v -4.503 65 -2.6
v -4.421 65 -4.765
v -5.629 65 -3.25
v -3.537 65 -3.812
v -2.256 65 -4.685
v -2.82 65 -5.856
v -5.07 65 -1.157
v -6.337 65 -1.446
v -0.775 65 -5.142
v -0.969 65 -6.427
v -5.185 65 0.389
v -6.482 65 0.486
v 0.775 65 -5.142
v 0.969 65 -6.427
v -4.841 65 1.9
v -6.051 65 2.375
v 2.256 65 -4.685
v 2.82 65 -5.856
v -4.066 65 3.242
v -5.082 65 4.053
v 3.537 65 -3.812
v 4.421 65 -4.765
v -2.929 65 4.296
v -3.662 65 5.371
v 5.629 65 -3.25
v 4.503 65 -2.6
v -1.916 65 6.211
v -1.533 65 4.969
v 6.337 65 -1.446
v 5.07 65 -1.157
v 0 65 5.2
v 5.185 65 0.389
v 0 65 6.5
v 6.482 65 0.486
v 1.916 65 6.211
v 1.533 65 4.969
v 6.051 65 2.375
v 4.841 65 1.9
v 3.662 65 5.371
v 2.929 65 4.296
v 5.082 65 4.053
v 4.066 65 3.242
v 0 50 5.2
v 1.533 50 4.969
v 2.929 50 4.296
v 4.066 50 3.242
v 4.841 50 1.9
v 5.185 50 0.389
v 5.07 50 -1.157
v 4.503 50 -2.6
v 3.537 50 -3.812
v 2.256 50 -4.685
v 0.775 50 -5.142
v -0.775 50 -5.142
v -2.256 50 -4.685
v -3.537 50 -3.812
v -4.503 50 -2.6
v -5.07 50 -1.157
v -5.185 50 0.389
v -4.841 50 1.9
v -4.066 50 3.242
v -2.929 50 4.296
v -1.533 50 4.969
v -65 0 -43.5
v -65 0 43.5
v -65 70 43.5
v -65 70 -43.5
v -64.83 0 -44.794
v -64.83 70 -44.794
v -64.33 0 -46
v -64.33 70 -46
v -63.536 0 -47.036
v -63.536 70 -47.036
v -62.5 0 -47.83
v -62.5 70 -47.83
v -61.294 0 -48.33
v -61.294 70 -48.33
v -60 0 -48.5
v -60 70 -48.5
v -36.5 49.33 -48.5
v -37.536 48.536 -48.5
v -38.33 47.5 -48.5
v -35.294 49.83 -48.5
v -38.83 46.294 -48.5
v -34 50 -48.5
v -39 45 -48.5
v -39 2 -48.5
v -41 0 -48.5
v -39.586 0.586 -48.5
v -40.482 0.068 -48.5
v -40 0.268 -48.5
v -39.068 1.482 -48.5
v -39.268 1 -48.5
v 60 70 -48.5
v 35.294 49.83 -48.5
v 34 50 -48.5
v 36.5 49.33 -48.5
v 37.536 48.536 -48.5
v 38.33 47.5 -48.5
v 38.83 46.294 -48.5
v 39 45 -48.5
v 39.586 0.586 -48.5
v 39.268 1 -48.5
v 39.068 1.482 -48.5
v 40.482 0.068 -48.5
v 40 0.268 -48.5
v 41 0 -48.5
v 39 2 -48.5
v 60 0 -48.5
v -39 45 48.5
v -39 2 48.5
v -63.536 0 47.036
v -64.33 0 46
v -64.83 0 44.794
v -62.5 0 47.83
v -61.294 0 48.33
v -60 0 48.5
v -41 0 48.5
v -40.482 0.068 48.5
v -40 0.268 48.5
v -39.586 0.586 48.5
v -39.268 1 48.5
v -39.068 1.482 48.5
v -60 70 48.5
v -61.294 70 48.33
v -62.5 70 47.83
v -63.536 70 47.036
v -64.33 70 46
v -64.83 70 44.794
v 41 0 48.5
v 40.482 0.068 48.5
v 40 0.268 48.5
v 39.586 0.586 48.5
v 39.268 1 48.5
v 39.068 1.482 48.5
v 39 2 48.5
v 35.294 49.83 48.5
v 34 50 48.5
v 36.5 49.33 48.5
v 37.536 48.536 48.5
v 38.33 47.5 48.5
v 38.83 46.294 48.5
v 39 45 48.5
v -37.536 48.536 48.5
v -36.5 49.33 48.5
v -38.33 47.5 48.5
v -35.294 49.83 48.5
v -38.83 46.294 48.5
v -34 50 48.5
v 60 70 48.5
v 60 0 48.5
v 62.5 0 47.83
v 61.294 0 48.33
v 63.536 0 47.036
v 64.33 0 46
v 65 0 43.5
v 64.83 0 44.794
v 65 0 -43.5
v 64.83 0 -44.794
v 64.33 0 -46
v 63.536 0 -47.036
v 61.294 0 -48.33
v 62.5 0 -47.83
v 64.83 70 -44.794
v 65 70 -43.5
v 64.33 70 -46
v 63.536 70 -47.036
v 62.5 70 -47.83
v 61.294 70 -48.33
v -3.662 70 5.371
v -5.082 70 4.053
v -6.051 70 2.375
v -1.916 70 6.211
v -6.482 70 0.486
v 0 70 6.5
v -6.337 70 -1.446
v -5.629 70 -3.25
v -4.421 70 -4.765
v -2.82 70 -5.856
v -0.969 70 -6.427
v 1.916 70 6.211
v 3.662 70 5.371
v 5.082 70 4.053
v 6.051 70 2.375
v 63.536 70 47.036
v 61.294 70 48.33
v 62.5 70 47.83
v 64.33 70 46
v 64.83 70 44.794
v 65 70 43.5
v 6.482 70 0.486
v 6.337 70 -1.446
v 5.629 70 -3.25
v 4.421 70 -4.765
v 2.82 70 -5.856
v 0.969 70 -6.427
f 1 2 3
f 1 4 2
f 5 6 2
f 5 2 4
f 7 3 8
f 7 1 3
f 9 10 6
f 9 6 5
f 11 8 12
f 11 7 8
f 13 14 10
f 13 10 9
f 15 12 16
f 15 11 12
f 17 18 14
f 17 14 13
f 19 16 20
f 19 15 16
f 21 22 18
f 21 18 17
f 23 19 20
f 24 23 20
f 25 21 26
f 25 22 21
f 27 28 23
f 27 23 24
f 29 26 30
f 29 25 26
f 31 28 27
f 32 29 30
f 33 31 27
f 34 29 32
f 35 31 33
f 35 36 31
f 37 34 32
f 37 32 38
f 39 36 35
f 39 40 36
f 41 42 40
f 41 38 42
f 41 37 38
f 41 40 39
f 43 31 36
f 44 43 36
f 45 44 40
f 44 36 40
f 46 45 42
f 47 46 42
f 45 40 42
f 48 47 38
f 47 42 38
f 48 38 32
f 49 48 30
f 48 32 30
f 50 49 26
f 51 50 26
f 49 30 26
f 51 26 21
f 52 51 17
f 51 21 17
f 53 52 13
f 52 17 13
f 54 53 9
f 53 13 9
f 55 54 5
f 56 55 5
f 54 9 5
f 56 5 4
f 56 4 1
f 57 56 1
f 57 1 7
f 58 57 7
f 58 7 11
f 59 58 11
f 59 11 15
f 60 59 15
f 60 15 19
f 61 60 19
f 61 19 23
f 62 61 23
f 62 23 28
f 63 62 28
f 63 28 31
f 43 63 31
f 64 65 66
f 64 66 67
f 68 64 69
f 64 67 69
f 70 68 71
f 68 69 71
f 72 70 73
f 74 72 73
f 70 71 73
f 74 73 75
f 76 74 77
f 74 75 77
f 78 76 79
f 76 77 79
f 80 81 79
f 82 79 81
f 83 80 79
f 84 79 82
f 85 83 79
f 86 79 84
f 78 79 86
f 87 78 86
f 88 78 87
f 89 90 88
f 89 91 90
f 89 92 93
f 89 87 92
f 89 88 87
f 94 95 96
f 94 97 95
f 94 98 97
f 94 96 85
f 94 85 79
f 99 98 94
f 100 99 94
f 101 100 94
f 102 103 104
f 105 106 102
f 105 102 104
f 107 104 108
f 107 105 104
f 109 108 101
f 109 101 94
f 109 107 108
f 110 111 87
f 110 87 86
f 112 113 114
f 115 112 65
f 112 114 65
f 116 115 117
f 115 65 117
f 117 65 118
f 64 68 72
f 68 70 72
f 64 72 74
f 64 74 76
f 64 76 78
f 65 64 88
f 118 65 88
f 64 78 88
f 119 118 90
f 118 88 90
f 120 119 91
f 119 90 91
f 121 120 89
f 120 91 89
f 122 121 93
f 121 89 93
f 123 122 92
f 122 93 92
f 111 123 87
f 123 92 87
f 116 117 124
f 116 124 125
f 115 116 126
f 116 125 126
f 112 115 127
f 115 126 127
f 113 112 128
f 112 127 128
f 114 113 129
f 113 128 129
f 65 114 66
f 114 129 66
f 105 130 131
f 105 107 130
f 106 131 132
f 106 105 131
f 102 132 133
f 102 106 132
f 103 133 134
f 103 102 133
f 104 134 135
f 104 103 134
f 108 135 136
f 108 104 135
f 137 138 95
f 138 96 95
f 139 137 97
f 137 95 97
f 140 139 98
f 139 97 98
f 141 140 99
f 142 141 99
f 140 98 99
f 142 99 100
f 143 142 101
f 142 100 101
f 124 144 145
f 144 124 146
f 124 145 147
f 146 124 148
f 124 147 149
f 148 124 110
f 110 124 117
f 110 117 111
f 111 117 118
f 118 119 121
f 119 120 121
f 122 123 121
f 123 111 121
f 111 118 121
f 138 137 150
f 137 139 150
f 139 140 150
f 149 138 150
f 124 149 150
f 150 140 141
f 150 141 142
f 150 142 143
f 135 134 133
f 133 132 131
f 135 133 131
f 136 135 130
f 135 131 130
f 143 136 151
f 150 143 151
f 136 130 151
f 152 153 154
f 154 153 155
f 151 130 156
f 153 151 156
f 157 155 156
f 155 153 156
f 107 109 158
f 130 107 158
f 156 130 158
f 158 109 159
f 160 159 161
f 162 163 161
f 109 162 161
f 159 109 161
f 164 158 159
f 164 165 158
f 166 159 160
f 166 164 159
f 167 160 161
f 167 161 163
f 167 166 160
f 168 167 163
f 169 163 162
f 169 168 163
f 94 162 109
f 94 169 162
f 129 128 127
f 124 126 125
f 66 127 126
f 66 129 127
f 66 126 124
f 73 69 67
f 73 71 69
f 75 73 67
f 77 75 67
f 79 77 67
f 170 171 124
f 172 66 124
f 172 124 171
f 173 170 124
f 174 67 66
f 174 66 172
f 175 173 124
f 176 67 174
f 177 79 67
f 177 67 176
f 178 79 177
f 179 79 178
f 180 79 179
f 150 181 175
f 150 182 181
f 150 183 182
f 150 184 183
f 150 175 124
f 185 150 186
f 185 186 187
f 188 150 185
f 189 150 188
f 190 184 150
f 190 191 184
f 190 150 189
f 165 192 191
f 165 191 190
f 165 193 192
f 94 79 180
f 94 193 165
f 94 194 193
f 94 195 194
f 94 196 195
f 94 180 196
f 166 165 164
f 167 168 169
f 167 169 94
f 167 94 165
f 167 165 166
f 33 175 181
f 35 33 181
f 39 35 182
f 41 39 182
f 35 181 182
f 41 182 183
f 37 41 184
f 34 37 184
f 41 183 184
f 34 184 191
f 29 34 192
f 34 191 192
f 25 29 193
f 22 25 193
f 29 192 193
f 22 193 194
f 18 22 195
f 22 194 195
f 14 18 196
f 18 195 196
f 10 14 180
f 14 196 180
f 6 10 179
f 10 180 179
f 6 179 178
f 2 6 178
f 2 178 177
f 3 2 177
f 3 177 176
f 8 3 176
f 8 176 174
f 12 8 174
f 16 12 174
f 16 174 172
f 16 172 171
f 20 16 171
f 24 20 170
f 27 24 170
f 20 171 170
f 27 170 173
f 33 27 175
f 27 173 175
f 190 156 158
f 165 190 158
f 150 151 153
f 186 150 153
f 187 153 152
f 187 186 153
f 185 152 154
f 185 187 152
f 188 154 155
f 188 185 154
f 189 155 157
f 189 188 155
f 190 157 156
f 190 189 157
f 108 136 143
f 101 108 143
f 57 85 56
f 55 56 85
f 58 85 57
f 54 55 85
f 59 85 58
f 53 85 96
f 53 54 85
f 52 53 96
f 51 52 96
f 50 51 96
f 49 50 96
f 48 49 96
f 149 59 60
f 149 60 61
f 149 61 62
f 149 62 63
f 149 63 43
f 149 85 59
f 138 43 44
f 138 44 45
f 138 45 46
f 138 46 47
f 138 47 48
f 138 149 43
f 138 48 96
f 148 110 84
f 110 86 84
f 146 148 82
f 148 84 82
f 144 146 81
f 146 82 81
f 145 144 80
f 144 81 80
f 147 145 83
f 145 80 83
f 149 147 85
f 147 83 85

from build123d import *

# Parameters (mm, degrees)
SKETCH1_W           = 130
SKETCH1_H           = 97
BOSS_EXTRUDE1_DEPTH = 70
SKETCH2_W           = 78
SKETCH2_H           = 50
CUT_EXTRUDE1_DEPTH  = 137.1396342
FILLET3_R           = 5
SKETCH3_R           = 5.2
CUT_EXTRUDE2_DEPTH  = 108.131928014
SKETCH4_R           = 6.5
CUT_EXTRUDE3_DEPTH  = 5
FILLET2_R           = 5
FILLET4_R           = 2


with BuildPart() as part:
    # Sketch1 → Boss-Extrude1 (new body)
    with BuildSketch(Plane(origin=(0, 0, 0), x_dir=(1, 0, 0), z_dir=(0, 1, 0))):
        Rectangle(SKETCH1_W, SKETCH1_H)
    extrude(amount=BOSS_EXTRUDE1_DEPTH)

    # Sketch2 → Cut-Extrude1 (cut, through all)
    with BuildSketch(Plane.XY.offset(48.5)):
        with Locations((0, 25)):
            Rectangle(SKETCH2_W, SKETCH2_H)
    extrude(amount=-CUT_EXTRUDE1_DEPTH, mode=Mode.SUBTRACT)

    # Fillet3
    fillet3_edges = [part.edges().sort_by_distance(p)[0] for p in [
        (-39, 50, 0),
        (39, 50, 0),
    ]]
    fillet(fillet3_edges, radius=FILLET3_R)

    # Sketch3 → Cut-Extrude2 (cut, through all)
    with BuildSketch(Plane(origin=(0, 70, 0), x_dir=(1, 0, 0), z_dir=(0, 1, 0))):
        with Locations(Location((0, 0, 0), (0, 0, 270))):
            Circle(SKETCH3_R)
    extrude(amount=-CUT_EXTRUDE2_DEPTH, mode=Mode.SUBTRACT)

    # Sketch4 → Cut-Extrude3 (cut)
    with BuildSketch(Plane(origin=(0, 70, 0), x_dir=(1, 0, 0), z_dir=(0, 1, 0))):
        with Locations(Location((0, 0, 0), (0, 0, 270))):
            Circle(SKETCH4_R)
    extrude(amount=-CUT_EXTRUDE3_DEPTH, mode=Mode.SUBTRACT)

    # Fillet2
    fillet2_edges = [part.edges().sort_by_distance(p)[0] for p in [
        (-65, 35, 48.5),
        (-65, 35, -48.5),
        (65, 35, -48.5),
        (65, 35, 48.5),
    ]]
    fillet(fillet2_edges, radius=FILLET2_R)

    # Fillet4
    fillet4_edges = [part.edges().sort_by_distance(p)[0] for p in [
        (-39, 0, 0),
        (39, 0, 0),
    ]]
    fillet(fillet4_edges, radius=FILLET4_R)


solid = part.part
